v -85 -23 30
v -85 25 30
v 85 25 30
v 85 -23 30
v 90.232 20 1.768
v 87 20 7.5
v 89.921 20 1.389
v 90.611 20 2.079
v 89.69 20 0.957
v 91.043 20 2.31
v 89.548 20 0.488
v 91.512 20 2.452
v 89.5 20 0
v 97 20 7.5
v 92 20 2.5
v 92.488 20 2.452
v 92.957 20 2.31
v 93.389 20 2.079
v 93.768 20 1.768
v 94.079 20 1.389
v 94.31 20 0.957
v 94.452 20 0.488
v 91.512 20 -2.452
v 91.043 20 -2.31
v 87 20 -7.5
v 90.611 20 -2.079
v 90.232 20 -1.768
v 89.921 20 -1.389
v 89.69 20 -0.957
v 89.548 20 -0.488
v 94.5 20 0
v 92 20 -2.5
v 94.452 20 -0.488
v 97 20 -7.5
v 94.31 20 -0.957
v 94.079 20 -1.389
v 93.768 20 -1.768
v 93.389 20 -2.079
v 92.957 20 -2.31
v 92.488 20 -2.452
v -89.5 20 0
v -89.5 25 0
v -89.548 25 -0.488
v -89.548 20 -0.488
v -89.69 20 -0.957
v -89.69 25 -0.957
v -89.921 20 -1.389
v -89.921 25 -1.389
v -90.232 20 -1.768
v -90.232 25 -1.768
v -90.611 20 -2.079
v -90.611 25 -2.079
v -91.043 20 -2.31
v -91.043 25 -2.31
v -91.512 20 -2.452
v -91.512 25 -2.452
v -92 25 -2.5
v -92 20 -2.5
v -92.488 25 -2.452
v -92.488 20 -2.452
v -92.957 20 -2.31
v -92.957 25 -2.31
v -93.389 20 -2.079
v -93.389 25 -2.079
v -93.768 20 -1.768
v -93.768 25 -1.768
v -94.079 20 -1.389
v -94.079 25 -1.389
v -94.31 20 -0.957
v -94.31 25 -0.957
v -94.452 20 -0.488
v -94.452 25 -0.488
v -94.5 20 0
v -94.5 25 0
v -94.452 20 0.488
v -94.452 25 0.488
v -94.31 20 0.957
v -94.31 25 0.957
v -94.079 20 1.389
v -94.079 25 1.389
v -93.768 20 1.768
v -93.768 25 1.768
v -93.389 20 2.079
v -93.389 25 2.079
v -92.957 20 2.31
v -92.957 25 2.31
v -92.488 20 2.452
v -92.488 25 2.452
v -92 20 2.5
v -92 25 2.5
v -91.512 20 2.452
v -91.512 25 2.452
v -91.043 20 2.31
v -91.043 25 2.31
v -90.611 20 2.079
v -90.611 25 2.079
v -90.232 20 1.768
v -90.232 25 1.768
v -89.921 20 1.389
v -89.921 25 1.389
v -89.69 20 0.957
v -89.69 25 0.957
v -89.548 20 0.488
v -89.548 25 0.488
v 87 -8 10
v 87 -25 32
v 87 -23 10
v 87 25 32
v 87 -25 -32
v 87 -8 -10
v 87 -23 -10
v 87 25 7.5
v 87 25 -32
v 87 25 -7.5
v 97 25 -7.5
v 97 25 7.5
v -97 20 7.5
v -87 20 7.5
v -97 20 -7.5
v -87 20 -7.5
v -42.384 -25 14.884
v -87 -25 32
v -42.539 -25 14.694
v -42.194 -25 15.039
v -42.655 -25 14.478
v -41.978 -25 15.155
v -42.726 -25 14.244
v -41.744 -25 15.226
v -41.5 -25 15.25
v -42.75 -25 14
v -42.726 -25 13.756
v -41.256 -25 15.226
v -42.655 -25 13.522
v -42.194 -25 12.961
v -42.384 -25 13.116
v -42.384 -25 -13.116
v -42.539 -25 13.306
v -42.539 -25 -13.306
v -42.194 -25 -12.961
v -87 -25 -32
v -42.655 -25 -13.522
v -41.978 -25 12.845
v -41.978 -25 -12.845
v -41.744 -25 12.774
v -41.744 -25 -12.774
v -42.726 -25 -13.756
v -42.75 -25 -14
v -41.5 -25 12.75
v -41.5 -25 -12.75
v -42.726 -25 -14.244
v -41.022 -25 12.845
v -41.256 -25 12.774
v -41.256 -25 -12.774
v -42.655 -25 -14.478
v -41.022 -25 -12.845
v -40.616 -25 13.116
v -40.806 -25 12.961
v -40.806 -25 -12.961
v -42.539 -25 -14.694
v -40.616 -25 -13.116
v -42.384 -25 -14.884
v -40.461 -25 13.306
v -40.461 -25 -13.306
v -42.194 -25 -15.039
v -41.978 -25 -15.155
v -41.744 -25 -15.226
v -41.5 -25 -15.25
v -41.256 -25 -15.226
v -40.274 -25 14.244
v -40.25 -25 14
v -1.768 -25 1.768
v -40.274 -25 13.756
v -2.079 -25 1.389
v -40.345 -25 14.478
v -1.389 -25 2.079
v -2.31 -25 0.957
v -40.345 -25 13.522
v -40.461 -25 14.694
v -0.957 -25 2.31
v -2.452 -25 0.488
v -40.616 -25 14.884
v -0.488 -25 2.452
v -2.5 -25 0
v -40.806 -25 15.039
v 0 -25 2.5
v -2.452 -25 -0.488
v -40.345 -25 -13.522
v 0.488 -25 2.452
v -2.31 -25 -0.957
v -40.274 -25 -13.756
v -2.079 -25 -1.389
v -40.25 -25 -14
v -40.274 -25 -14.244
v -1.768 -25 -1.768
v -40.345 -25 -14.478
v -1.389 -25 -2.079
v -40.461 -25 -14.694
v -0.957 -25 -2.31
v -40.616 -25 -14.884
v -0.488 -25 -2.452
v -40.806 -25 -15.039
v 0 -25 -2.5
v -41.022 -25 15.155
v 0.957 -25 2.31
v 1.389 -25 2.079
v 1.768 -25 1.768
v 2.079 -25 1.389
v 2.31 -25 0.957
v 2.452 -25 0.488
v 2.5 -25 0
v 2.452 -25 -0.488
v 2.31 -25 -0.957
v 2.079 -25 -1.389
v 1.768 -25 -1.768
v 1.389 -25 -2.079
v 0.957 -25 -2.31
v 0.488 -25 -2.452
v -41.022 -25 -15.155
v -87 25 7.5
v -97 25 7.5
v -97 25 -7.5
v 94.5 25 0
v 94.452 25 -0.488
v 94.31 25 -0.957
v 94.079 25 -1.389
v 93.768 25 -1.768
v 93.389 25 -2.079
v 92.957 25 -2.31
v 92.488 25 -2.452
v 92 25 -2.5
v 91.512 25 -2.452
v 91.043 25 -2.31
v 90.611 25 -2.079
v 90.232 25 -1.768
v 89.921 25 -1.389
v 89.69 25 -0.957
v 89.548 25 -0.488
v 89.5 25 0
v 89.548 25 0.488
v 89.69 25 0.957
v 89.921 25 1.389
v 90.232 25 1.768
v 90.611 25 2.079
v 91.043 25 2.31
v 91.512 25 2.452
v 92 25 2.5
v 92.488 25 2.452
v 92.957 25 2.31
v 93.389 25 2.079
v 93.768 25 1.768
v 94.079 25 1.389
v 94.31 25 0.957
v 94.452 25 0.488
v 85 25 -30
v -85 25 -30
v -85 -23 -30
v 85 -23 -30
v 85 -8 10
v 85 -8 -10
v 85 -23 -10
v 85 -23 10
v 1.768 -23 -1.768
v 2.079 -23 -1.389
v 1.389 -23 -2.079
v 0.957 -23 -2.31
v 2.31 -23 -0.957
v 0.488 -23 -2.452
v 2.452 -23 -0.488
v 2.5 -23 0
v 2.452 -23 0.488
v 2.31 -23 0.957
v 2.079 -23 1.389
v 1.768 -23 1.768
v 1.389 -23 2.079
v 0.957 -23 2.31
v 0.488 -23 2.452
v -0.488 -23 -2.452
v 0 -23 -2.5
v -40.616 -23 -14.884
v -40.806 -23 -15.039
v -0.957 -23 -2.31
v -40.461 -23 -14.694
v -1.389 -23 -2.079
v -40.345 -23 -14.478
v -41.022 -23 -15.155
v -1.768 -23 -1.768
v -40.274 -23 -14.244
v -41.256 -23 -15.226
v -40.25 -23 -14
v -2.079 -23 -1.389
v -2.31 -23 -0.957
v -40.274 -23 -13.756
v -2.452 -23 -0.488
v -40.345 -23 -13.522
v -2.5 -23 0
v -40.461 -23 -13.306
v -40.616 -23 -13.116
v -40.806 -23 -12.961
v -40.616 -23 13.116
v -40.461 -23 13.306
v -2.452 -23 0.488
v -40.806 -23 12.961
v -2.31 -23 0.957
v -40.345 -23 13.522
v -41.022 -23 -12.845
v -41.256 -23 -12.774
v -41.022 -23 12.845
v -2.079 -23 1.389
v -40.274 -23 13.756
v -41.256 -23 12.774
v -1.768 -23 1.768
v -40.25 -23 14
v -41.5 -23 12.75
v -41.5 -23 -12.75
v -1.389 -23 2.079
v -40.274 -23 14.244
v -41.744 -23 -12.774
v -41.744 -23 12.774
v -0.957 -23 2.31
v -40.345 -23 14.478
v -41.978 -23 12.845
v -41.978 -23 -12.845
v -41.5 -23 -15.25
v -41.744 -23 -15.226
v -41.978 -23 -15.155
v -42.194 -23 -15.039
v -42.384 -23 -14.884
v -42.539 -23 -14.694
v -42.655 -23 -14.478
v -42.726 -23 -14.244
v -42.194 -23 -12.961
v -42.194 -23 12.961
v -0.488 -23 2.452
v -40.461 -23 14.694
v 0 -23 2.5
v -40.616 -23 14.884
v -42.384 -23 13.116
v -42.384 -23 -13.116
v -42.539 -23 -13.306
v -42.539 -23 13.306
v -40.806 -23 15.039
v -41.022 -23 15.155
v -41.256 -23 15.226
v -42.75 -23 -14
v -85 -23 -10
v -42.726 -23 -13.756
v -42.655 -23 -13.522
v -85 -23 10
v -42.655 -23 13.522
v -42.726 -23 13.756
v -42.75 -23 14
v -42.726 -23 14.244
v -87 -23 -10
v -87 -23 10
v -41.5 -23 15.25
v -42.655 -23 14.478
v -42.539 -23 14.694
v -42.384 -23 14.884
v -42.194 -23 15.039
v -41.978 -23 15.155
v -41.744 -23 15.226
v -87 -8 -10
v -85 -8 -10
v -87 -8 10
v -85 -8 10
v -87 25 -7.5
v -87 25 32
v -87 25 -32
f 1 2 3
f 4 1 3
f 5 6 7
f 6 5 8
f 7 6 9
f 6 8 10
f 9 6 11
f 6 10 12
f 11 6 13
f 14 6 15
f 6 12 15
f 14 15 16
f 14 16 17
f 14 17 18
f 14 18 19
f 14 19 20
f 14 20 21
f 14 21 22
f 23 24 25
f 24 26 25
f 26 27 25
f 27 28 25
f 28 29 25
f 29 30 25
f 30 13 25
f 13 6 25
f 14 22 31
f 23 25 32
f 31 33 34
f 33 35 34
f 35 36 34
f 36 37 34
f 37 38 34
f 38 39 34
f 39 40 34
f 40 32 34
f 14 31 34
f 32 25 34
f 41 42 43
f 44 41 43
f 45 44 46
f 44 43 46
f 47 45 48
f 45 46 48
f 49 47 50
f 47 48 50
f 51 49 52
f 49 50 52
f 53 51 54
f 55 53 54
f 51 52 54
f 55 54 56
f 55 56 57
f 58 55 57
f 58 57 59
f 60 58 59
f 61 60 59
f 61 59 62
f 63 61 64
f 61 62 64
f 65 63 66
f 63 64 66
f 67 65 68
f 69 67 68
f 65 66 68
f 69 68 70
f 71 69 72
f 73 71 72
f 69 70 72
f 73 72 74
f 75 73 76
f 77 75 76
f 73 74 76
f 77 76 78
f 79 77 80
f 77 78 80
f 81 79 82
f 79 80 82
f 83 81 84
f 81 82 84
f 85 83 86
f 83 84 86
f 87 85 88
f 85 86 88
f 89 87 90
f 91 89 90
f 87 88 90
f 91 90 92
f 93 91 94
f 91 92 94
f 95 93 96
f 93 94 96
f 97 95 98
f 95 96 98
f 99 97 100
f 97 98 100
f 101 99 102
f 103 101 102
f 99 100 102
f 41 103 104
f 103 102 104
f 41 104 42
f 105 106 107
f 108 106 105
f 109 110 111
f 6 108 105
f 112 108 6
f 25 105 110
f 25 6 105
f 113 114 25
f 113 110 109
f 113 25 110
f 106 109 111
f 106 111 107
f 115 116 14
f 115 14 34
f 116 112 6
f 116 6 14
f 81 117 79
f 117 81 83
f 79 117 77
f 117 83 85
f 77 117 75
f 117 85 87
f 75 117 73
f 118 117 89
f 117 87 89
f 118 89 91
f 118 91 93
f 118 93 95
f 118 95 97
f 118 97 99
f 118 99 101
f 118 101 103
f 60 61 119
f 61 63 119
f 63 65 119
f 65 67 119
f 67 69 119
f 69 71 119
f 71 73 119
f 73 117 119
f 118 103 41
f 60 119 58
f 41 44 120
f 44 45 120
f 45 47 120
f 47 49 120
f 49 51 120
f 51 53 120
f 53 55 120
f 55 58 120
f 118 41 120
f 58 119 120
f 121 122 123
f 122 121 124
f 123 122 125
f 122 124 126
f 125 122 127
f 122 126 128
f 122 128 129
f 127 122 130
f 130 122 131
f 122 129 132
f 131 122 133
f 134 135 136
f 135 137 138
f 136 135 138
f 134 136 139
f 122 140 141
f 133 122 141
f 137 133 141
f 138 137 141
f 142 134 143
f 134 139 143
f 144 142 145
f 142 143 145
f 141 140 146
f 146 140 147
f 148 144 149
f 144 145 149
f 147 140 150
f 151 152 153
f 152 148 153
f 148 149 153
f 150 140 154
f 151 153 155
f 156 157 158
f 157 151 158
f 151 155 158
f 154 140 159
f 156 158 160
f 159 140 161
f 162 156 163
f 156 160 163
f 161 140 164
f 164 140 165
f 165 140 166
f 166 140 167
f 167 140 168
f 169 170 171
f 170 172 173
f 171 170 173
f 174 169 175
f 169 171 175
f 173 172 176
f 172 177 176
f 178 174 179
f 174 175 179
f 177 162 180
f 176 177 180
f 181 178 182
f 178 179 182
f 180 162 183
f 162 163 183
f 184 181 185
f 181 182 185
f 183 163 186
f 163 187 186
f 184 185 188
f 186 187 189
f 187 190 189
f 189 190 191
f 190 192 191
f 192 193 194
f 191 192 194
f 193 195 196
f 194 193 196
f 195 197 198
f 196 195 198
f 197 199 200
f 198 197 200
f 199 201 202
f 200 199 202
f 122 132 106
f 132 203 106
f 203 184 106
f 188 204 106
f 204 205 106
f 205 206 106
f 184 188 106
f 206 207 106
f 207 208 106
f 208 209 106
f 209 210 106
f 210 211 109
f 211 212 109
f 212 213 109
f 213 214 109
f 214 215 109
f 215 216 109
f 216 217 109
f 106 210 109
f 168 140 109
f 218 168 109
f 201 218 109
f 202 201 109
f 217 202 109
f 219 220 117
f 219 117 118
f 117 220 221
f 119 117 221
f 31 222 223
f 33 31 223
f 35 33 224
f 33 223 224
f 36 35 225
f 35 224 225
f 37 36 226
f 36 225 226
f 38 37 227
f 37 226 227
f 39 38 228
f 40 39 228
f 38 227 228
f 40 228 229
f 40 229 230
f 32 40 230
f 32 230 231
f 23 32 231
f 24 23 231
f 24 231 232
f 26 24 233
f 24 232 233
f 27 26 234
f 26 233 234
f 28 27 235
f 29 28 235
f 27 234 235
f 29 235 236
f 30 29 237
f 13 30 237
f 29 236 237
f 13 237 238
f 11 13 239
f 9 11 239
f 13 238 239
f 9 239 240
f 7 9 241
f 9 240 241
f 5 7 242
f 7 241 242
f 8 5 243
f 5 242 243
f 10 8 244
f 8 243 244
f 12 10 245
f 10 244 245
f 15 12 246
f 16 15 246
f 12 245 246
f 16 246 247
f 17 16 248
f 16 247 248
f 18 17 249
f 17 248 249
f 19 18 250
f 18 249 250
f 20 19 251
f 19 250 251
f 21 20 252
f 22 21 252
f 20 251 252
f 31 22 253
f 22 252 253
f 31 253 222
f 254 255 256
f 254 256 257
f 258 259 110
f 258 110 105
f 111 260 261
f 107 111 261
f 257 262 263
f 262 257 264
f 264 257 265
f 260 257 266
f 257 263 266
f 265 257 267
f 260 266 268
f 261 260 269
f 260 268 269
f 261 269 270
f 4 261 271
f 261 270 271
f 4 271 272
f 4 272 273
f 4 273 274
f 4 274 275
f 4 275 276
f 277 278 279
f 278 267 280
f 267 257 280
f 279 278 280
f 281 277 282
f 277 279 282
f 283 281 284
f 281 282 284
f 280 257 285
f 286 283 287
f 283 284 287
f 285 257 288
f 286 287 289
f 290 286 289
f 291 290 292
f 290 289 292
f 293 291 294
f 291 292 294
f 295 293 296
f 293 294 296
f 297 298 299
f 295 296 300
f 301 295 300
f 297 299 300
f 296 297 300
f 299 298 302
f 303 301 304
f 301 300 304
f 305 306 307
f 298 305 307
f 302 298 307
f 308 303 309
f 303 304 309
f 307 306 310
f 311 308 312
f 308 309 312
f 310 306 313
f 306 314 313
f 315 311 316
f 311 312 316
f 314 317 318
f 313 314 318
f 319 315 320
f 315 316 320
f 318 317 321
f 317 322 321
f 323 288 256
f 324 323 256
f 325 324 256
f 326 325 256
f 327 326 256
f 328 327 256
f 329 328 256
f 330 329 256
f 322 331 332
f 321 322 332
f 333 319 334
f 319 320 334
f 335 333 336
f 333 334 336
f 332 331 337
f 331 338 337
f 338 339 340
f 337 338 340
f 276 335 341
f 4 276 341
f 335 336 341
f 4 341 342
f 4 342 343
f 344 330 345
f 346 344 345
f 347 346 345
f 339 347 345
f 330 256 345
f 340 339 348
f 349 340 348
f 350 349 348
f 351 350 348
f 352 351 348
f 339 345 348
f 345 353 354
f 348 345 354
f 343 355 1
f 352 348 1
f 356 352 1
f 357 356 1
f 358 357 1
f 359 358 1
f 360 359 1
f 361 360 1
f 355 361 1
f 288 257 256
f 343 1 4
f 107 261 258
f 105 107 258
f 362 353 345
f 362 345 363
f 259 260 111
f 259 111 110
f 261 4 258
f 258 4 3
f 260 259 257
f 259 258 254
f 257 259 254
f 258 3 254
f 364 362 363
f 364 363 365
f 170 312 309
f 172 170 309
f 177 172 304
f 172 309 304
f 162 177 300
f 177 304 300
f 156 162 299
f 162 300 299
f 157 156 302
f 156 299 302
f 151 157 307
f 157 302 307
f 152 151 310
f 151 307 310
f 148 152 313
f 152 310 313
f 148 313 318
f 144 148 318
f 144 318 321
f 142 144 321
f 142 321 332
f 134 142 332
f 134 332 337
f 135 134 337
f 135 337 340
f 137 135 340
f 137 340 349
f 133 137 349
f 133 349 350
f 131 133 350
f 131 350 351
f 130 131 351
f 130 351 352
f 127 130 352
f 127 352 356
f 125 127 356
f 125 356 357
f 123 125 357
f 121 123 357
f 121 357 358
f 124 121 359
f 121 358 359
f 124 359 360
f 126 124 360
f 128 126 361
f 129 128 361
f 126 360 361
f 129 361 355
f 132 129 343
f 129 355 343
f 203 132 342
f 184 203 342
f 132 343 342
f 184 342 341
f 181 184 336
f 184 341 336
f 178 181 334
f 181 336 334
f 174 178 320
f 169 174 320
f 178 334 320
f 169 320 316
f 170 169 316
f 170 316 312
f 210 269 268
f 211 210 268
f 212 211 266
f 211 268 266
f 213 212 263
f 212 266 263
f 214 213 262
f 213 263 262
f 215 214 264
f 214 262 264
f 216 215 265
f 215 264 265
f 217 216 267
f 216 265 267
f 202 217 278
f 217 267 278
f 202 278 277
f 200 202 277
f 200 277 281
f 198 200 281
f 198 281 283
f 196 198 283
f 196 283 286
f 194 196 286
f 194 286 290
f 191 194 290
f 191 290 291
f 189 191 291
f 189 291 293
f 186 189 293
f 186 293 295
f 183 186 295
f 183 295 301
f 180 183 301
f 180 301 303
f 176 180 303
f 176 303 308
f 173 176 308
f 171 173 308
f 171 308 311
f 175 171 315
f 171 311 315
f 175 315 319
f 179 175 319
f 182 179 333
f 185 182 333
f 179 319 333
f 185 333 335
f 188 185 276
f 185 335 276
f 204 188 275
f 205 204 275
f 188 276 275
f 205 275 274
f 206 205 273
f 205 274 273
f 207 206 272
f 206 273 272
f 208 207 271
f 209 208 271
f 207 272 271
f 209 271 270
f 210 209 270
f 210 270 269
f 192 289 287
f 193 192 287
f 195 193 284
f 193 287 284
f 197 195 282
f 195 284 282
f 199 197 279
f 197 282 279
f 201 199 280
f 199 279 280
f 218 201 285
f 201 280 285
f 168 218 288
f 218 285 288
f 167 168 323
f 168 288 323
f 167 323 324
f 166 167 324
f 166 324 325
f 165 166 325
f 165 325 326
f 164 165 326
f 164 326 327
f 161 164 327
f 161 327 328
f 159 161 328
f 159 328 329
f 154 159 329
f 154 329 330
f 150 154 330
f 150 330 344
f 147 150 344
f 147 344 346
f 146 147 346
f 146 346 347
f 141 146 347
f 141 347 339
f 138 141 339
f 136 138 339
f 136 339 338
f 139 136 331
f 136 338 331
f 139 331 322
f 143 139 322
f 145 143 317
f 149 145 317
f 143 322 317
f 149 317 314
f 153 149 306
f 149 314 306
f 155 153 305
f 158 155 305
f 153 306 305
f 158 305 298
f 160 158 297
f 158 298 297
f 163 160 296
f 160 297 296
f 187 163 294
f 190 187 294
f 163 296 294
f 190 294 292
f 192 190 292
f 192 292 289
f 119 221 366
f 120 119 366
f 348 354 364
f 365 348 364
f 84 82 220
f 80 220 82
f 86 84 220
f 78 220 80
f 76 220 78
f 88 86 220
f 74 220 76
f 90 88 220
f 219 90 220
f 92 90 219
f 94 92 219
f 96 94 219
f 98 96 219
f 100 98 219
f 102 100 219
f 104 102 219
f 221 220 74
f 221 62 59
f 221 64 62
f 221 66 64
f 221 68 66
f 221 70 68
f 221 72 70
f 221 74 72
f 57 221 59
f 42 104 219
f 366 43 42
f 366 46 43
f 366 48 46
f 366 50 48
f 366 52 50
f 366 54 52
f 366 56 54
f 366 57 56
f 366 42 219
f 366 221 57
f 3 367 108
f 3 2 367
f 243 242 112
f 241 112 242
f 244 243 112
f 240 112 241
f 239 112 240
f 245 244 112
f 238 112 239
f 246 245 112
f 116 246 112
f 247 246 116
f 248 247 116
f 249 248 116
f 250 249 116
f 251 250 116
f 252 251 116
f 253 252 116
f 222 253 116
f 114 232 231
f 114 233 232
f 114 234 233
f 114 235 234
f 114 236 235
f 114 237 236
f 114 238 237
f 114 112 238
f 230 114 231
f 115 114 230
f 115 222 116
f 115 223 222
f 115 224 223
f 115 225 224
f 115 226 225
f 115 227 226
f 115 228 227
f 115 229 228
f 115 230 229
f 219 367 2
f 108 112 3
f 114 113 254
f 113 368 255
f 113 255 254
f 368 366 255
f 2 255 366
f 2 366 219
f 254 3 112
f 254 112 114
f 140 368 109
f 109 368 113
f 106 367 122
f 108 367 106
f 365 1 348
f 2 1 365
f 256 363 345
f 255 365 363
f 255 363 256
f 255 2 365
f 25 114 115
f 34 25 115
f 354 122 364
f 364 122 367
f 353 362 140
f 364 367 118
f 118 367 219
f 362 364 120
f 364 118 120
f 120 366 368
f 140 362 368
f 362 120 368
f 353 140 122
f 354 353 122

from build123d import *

# Parameters (mm, degrees)
SKETCH1_W           = 174
SKETCH1_H           = 64
SKETCH1_W_2         = 170
SKETCH1_H_2         = 60
BOSS_EXTRUDE1_DEPTH = 25
SKETCH2_W           = 174
SKETCH2_H           = 2
BOSS_EXTRUDE2_DEPTH = 64
SKETCH9_W           = 10
SKETCH9_H           = 15
SKETCH9_R           = 2.5
BOSS_EXTRUDE3_DEPTH = 5
SKETCH10_W          = 20
SKETCH10_H          = 15
CUT_EXTRUDE2_DEPTH  = 174
CUT_EXTRUDE3_REACH  = 4
SKETCH11_R          = 2.5
SKETCH11_R_2        = 1.25


with BuildPart() as part:
    # Sketch1 → Boss-Extrude1 (new body, symmetric)
    with BuildSketch(Plane(origin=(0, 0, 0), x_dir=(1, 0, 0), z_dir=(0, 1, 0))):
        Rectangle(SKETCH1_W, SKETCH1_H)
        Rectangle(SKETCH1_W_2, SKETCH1_H_2, mode=Mode.SUBTRACT)
    extrude(amount=BOSS_EXTRUDE1_DEPTH, both=True)

    # Sketch2 → Boss-Extrude2 (add)
    with BuildSketch(Plane(origin=(0, 0, -32), x_dir=(-1, 0, 0), z_dir=(0, 0, -1))):
        with Locations((0, -24)):
            Rectangle(SKETCH2_W, SKETCH2_H)
    extrude(amount=-BOSS_EXTRUDE2_DEPTH)

    # Sketch9 → Boss-Extrude3 (add)
    with BuildSketch(Plane(origin=(0, 25, 0), x_dir=(1, 0, 0), z_dir=(0, 1, 0))):
        with Locations((-92, 0)):
            Rectangle(SKETCH9_W, SKETCH9_H)
        with Locations((-92, 0)):
            Circle(SKETCH9_R, mode=Mode.SUBTRACT)
        with Locations((92, 0)):
            Rectangle(SKETCH9_W, SKETCH9_H)
        with Locations((92, 0)):
            Circle(SKETCH9_R, mode=Mode.SUBTRACT)
    extrude(amount=-BOSS_EXTRUDE3_DEPTH)

    # Sketch10 → Cut-Extrude2 (cut)
    with BuildSketch(Plane.ZY.offset(87)):
        with Locations((0, -15.5)):
            Rectangle(SKETCH10_W, SKETCH10_H)
    extrude(amount=-CUT_EXTRUDE2_DEPTH, mode=Mode.SUBTRACT)

    # Sketch11 → Cut-Extrude3 (cut, up to next)
    with BuildSketch(Plane(origin=(0, -23, 0), x_dir=(1, 0, 0), z_dir=(0, 1, 0)), mode=Mode.PRIVATE) as cut_extrude3_sk1:
        Circle(SKETCH11_R)
    cut_extrude3_tool1 = extrude(cut_extrude3_sk1.sketch, amount=-CUT_EXTRUDE3_REACH, mode=Mode.PRIVATE) & part.part
    add(cut_extrude3_tool1.solids().sort_by_distance((0, -23, 0))[0], mode=Mode.SUBTRACT)
    # Sketch11 → Cut-Extrude3 (cut, up to next)
    with BuildSketch(Plane(origin=(0, -23, 0), x_dir=(1, 0, 0), z_dir=(0, 1, 0)), mode=Mode.PRIVATE) as cut_extrude3_sk2:
        with Locations((-41.5, 14)):
            Circle(SKETCH11_R_2)
    cut_extrude3_tool2 = extrude(cut_extrude3_sk2.sketch, amount=-CUT_EXTRUDE3_REACH, mode=Mode.PRIVATE) & part.part
    add(cut_extrude3_tool2.solids().sort_by_distance((-41.5, -23, -14))[0], mode=Mode.SUBTRACT)
    # Sketch11 → Cut-Extrude3 (cut, up to next)
    with BuildSketch(Plane(origin=(0, -23, 0), x_dir=(1, 0, 0), z_dir=(0, 1, 0)), mode=Mode.PRIVATE) as cut_extrude3_sk3:
        with Locations((-41.5, -14)):
            Circle(SKETCH11_R_2)
    cut_extrude3_tool3 = extrude(cut_extrude3_sk3.sketch, amount=-CUT_EXTRUDE3_REACH, mode=Mode.PRIVATE) & part.part
    add(cut_extrude3_tool3.solids().sort_by_distance((-41.5, -23, 14))[0], mode=Mode.SUBTRACT)


solid = part.part
